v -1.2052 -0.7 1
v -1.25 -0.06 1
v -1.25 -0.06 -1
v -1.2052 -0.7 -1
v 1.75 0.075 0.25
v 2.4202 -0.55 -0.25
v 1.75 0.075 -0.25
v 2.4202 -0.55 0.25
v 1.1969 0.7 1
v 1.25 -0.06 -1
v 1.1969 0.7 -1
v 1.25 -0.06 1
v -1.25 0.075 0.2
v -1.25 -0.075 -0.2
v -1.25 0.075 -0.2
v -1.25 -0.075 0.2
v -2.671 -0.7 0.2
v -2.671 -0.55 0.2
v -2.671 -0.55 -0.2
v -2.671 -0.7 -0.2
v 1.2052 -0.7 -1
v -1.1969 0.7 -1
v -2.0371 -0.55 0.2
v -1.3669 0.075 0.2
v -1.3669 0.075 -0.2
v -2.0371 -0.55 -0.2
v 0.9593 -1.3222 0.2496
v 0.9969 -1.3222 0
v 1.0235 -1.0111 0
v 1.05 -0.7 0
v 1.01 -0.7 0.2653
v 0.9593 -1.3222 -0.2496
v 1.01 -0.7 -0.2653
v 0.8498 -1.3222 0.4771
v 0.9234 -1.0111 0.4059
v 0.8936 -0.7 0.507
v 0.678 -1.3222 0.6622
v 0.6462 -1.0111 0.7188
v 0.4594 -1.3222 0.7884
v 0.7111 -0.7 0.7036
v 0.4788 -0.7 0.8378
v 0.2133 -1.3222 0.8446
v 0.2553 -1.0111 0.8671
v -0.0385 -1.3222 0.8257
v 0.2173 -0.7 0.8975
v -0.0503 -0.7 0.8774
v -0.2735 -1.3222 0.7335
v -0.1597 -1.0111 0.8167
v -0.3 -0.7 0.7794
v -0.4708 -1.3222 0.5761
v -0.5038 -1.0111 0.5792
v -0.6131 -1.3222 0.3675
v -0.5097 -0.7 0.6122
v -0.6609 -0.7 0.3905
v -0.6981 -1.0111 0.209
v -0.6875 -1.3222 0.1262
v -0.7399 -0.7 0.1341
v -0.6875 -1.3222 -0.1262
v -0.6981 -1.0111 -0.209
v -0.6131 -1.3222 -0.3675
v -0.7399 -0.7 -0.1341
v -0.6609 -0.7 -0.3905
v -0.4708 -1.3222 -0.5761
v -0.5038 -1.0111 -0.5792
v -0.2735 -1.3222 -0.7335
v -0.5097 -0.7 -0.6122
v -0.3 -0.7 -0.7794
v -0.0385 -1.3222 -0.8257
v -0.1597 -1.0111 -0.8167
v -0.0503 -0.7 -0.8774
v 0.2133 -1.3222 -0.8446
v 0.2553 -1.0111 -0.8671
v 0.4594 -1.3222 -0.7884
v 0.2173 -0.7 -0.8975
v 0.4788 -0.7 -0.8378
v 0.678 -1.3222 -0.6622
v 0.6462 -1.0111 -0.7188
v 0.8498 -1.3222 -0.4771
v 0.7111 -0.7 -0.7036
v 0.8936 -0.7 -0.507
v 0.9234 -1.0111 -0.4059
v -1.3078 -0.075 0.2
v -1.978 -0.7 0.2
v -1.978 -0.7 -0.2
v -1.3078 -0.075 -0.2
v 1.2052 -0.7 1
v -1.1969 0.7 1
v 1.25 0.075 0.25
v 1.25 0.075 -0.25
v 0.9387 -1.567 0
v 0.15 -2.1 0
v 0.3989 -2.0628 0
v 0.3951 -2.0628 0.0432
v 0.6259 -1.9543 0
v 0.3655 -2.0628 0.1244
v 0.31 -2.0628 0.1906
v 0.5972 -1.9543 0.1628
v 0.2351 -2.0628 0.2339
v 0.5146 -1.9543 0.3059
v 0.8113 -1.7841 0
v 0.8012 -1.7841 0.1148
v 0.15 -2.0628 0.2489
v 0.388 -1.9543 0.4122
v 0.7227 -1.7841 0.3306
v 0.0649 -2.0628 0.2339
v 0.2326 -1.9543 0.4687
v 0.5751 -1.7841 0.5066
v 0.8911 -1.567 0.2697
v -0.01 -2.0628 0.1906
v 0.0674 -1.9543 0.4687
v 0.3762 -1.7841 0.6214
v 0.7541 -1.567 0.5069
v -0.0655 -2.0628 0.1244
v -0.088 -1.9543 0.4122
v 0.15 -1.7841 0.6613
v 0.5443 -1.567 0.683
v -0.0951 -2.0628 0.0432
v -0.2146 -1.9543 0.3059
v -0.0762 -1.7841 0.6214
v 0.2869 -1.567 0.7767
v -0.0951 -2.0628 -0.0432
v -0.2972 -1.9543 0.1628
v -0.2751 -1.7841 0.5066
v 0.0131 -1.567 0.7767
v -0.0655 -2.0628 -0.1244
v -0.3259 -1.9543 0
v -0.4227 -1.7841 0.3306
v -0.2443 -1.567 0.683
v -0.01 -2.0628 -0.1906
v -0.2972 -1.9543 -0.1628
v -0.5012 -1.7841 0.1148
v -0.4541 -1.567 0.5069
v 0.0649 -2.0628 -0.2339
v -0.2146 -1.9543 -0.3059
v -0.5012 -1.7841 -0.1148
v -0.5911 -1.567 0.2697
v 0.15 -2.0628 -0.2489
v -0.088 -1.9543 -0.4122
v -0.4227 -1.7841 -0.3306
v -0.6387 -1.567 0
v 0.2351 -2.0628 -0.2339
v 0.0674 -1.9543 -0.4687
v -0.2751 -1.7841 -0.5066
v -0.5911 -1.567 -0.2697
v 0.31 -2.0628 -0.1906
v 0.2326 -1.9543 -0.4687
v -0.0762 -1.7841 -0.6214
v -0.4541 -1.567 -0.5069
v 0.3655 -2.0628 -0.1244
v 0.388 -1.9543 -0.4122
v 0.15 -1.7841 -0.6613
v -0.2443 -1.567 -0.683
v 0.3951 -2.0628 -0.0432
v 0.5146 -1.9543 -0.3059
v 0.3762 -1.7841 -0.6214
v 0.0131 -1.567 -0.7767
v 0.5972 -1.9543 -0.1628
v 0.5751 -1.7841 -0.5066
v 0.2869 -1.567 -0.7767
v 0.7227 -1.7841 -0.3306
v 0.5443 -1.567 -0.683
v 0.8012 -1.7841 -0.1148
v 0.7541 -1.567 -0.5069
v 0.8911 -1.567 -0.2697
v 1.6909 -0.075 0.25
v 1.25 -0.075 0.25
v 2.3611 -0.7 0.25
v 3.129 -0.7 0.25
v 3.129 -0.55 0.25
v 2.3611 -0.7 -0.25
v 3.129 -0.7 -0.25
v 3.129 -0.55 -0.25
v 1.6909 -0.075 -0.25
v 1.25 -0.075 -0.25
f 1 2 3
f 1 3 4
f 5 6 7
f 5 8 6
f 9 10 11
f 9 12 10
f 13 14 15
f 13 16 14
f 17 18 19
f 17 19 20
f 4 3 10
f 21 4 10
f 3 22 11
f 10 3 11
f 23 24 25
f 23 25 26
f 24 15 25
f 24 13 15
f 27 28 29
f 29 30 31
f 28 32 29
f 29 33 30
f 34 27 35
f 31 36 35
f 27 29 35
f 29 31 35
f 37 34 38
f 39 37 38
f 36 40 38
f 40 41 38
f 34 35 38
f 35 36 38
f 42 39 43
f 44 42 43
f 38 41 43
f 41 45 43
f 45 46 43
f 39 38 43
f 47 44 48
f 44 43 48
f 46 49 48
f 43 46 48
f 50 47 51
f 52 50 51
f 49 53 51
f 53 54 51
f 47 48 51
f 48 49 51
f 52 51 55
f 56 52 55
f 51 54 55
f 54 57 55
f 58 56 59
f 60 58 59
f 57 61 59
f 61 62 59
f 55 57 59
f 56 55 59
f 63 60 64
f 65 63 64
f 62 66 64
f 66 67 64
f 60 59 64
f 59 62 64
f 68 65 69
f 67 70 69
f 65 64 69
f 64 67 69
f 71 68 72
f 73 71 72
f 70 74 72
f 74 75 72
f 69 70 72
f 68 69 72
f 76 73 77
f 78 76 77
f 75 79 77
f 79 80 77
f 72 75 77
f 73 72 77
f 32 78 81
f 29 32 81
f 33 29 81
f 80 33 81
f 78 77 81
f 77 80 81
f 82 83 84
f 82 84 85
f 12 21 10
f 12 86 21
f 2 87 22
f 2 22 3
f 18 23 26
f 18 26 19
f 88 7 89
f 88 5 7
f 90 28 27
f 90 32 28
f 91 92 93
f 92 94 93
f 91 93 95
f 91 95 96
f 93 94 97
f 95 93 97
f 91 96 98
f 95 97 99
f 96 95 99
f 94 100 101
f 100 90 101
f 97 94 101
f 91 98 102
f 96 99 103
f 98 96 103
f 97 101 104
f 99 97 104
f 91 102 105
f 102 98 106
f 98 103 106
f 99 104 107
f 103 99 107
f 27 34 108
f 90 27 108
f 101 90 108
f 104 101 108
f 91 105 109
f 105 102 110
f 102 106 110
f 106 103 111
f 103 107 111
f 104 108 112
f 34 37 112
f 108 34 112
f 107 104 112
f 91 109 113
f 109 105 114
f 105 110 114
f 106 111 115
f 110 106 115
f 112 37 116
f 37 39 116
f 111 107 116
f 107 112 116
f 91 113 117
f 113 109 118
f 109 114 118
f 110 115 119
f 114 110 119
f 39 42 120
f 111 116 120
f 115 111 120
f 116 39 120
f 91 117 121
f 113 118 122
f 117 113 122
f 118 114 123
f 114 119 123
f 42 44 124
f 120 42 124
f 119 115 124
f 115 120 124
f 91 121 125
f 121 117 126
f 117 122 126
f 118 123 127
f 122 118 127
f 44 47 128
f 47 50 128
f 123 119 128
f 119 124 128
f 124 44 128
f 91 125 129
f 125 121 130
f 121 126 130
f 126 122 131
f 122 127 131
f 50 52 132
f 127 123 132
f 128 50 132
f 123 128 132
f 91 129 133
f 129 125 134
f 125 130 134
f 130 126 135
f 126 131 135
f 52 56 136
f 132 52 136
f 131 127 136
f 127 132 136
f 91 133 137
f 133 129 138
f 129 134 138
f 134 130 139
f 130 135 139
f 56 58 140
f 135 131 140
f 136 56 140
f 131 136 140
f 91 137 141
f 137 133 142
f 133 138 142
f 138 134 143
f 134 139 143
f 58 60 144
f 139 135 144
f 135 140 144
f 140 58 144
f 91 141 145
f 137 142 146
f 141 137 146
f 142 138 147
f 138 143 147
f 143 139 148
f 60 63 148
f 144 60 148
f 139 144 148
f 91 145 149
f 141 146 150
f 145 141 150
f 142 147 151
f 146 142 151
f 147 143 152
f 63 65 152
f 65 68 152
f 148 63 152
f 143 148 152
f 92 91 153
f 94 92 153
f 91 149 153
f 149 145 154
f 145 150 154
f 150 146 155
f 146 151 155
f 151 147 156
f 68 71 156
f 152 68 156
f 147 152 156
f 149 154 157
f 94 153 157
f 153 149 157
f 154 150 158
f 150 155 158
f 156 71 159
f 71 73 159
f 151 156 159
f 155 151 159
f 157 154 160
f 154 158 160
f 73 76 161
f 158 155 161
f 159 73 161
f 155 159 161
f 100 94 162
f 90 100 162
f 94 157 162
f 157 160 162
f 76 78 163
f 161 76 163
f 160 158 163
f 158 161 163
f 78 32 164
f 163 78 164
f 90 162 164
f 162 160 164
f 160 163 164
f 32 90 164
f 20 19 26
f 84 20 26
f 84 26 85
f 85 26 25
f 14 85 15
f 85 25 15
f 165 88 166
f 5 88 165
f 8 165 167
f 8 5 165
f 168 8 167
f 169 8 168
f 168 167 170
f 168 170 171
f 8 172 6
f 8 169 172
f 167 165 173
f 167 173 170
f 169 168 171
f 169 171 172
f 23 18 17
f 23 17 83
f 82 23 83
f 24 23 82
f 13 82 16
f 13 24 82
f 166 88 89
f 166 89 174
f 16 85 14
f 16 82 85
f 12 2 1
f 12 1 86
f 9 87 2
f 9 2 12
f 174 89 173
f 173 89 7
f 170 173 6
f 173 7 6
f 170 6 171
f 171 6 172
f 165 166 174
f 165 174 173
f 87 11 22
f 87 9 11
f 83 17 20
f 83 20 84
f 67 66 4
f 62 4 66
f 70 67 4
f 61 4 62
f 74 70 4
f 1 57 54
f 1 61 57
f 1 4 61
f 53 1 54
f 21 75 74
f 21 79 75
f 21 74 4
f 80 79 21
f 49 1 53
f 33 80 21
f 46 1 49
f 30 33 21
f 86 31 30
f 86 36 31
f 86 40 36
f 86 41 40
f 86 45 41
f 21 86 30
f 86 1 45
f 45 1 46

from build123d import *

# Parameters (mm, degrees)
EXTRUDE1_DEPTH = 1
EXTRUDE2_DEPTH = 0.25
EXTRUDE3_DEPTH = 0.2


with BuildPart() as part:
    # Sketch1 → Extrude1 (new, symmetric)
    with BuildSketch(Plane.XY):
        Polygon((1.196855623, 0.7), (-1.196855623, 0.7), (-1.25, -0.06), (-1.20524684, -0.7), (1.20524684, -0.7), (1.25, -0.06), align=None)
    extrude(amount=EXTRUDE1_DEPTH, both=True)

    # Sketch1<6> → Revolve1 (revolve)
    with BuildSketch(Plane.XY):
        with BuildLine():
            Line((1.05, -0.7), (0.15, -0.7))
            Line((0.15, -0.7), (0.15, -2.1))
            ThreePointArc((0.15, -2.1), (0.724932924, -1.876060806), (0.996924635, -1.322240312))
            Line((0.996924635, -1.322240312), (1.05, -0.7))
        make_face()
    revolve(axis=Axis((0.15, -0.7, 0), (0, -1, 0)))


with BuildPart() as body_2:
    # Sketch1<3> → Extrude2 (new, symmetric)
    with BuildSketch(Plane.XY):
        Polygon((1.75, 0.075), (1.25, 0.075), (1.25, -0.075), (1.690913429, -0.075), (2.361143872, -0.7), (3.129003177, -0.7), (3.129003177, -0.55), (2.420230444, -0.55), align=None)
    extrude(amount=EXTRUDE2_DEPTH, both=True)


with BuildPart() as body_3:
    # Sketch1<5> → Extrude3 (new, symmetric)
    with BuildSketch(Plane.XY):
        Polygon((-1.25, 0.075), (-1.366855623, 0.075), (-2.037086067, -0.55), (-2.670996823, -0.55), (-2.670996823, -0.7), (-1.977999495, -0.7), (-1.307769052, -0.075), (-1.25, -0.075), align=None)
    extrude(amount=EXTRUDE3_DEPTH, both=True)


solid = Compound([part.part, body_2.part, body_3.part])
